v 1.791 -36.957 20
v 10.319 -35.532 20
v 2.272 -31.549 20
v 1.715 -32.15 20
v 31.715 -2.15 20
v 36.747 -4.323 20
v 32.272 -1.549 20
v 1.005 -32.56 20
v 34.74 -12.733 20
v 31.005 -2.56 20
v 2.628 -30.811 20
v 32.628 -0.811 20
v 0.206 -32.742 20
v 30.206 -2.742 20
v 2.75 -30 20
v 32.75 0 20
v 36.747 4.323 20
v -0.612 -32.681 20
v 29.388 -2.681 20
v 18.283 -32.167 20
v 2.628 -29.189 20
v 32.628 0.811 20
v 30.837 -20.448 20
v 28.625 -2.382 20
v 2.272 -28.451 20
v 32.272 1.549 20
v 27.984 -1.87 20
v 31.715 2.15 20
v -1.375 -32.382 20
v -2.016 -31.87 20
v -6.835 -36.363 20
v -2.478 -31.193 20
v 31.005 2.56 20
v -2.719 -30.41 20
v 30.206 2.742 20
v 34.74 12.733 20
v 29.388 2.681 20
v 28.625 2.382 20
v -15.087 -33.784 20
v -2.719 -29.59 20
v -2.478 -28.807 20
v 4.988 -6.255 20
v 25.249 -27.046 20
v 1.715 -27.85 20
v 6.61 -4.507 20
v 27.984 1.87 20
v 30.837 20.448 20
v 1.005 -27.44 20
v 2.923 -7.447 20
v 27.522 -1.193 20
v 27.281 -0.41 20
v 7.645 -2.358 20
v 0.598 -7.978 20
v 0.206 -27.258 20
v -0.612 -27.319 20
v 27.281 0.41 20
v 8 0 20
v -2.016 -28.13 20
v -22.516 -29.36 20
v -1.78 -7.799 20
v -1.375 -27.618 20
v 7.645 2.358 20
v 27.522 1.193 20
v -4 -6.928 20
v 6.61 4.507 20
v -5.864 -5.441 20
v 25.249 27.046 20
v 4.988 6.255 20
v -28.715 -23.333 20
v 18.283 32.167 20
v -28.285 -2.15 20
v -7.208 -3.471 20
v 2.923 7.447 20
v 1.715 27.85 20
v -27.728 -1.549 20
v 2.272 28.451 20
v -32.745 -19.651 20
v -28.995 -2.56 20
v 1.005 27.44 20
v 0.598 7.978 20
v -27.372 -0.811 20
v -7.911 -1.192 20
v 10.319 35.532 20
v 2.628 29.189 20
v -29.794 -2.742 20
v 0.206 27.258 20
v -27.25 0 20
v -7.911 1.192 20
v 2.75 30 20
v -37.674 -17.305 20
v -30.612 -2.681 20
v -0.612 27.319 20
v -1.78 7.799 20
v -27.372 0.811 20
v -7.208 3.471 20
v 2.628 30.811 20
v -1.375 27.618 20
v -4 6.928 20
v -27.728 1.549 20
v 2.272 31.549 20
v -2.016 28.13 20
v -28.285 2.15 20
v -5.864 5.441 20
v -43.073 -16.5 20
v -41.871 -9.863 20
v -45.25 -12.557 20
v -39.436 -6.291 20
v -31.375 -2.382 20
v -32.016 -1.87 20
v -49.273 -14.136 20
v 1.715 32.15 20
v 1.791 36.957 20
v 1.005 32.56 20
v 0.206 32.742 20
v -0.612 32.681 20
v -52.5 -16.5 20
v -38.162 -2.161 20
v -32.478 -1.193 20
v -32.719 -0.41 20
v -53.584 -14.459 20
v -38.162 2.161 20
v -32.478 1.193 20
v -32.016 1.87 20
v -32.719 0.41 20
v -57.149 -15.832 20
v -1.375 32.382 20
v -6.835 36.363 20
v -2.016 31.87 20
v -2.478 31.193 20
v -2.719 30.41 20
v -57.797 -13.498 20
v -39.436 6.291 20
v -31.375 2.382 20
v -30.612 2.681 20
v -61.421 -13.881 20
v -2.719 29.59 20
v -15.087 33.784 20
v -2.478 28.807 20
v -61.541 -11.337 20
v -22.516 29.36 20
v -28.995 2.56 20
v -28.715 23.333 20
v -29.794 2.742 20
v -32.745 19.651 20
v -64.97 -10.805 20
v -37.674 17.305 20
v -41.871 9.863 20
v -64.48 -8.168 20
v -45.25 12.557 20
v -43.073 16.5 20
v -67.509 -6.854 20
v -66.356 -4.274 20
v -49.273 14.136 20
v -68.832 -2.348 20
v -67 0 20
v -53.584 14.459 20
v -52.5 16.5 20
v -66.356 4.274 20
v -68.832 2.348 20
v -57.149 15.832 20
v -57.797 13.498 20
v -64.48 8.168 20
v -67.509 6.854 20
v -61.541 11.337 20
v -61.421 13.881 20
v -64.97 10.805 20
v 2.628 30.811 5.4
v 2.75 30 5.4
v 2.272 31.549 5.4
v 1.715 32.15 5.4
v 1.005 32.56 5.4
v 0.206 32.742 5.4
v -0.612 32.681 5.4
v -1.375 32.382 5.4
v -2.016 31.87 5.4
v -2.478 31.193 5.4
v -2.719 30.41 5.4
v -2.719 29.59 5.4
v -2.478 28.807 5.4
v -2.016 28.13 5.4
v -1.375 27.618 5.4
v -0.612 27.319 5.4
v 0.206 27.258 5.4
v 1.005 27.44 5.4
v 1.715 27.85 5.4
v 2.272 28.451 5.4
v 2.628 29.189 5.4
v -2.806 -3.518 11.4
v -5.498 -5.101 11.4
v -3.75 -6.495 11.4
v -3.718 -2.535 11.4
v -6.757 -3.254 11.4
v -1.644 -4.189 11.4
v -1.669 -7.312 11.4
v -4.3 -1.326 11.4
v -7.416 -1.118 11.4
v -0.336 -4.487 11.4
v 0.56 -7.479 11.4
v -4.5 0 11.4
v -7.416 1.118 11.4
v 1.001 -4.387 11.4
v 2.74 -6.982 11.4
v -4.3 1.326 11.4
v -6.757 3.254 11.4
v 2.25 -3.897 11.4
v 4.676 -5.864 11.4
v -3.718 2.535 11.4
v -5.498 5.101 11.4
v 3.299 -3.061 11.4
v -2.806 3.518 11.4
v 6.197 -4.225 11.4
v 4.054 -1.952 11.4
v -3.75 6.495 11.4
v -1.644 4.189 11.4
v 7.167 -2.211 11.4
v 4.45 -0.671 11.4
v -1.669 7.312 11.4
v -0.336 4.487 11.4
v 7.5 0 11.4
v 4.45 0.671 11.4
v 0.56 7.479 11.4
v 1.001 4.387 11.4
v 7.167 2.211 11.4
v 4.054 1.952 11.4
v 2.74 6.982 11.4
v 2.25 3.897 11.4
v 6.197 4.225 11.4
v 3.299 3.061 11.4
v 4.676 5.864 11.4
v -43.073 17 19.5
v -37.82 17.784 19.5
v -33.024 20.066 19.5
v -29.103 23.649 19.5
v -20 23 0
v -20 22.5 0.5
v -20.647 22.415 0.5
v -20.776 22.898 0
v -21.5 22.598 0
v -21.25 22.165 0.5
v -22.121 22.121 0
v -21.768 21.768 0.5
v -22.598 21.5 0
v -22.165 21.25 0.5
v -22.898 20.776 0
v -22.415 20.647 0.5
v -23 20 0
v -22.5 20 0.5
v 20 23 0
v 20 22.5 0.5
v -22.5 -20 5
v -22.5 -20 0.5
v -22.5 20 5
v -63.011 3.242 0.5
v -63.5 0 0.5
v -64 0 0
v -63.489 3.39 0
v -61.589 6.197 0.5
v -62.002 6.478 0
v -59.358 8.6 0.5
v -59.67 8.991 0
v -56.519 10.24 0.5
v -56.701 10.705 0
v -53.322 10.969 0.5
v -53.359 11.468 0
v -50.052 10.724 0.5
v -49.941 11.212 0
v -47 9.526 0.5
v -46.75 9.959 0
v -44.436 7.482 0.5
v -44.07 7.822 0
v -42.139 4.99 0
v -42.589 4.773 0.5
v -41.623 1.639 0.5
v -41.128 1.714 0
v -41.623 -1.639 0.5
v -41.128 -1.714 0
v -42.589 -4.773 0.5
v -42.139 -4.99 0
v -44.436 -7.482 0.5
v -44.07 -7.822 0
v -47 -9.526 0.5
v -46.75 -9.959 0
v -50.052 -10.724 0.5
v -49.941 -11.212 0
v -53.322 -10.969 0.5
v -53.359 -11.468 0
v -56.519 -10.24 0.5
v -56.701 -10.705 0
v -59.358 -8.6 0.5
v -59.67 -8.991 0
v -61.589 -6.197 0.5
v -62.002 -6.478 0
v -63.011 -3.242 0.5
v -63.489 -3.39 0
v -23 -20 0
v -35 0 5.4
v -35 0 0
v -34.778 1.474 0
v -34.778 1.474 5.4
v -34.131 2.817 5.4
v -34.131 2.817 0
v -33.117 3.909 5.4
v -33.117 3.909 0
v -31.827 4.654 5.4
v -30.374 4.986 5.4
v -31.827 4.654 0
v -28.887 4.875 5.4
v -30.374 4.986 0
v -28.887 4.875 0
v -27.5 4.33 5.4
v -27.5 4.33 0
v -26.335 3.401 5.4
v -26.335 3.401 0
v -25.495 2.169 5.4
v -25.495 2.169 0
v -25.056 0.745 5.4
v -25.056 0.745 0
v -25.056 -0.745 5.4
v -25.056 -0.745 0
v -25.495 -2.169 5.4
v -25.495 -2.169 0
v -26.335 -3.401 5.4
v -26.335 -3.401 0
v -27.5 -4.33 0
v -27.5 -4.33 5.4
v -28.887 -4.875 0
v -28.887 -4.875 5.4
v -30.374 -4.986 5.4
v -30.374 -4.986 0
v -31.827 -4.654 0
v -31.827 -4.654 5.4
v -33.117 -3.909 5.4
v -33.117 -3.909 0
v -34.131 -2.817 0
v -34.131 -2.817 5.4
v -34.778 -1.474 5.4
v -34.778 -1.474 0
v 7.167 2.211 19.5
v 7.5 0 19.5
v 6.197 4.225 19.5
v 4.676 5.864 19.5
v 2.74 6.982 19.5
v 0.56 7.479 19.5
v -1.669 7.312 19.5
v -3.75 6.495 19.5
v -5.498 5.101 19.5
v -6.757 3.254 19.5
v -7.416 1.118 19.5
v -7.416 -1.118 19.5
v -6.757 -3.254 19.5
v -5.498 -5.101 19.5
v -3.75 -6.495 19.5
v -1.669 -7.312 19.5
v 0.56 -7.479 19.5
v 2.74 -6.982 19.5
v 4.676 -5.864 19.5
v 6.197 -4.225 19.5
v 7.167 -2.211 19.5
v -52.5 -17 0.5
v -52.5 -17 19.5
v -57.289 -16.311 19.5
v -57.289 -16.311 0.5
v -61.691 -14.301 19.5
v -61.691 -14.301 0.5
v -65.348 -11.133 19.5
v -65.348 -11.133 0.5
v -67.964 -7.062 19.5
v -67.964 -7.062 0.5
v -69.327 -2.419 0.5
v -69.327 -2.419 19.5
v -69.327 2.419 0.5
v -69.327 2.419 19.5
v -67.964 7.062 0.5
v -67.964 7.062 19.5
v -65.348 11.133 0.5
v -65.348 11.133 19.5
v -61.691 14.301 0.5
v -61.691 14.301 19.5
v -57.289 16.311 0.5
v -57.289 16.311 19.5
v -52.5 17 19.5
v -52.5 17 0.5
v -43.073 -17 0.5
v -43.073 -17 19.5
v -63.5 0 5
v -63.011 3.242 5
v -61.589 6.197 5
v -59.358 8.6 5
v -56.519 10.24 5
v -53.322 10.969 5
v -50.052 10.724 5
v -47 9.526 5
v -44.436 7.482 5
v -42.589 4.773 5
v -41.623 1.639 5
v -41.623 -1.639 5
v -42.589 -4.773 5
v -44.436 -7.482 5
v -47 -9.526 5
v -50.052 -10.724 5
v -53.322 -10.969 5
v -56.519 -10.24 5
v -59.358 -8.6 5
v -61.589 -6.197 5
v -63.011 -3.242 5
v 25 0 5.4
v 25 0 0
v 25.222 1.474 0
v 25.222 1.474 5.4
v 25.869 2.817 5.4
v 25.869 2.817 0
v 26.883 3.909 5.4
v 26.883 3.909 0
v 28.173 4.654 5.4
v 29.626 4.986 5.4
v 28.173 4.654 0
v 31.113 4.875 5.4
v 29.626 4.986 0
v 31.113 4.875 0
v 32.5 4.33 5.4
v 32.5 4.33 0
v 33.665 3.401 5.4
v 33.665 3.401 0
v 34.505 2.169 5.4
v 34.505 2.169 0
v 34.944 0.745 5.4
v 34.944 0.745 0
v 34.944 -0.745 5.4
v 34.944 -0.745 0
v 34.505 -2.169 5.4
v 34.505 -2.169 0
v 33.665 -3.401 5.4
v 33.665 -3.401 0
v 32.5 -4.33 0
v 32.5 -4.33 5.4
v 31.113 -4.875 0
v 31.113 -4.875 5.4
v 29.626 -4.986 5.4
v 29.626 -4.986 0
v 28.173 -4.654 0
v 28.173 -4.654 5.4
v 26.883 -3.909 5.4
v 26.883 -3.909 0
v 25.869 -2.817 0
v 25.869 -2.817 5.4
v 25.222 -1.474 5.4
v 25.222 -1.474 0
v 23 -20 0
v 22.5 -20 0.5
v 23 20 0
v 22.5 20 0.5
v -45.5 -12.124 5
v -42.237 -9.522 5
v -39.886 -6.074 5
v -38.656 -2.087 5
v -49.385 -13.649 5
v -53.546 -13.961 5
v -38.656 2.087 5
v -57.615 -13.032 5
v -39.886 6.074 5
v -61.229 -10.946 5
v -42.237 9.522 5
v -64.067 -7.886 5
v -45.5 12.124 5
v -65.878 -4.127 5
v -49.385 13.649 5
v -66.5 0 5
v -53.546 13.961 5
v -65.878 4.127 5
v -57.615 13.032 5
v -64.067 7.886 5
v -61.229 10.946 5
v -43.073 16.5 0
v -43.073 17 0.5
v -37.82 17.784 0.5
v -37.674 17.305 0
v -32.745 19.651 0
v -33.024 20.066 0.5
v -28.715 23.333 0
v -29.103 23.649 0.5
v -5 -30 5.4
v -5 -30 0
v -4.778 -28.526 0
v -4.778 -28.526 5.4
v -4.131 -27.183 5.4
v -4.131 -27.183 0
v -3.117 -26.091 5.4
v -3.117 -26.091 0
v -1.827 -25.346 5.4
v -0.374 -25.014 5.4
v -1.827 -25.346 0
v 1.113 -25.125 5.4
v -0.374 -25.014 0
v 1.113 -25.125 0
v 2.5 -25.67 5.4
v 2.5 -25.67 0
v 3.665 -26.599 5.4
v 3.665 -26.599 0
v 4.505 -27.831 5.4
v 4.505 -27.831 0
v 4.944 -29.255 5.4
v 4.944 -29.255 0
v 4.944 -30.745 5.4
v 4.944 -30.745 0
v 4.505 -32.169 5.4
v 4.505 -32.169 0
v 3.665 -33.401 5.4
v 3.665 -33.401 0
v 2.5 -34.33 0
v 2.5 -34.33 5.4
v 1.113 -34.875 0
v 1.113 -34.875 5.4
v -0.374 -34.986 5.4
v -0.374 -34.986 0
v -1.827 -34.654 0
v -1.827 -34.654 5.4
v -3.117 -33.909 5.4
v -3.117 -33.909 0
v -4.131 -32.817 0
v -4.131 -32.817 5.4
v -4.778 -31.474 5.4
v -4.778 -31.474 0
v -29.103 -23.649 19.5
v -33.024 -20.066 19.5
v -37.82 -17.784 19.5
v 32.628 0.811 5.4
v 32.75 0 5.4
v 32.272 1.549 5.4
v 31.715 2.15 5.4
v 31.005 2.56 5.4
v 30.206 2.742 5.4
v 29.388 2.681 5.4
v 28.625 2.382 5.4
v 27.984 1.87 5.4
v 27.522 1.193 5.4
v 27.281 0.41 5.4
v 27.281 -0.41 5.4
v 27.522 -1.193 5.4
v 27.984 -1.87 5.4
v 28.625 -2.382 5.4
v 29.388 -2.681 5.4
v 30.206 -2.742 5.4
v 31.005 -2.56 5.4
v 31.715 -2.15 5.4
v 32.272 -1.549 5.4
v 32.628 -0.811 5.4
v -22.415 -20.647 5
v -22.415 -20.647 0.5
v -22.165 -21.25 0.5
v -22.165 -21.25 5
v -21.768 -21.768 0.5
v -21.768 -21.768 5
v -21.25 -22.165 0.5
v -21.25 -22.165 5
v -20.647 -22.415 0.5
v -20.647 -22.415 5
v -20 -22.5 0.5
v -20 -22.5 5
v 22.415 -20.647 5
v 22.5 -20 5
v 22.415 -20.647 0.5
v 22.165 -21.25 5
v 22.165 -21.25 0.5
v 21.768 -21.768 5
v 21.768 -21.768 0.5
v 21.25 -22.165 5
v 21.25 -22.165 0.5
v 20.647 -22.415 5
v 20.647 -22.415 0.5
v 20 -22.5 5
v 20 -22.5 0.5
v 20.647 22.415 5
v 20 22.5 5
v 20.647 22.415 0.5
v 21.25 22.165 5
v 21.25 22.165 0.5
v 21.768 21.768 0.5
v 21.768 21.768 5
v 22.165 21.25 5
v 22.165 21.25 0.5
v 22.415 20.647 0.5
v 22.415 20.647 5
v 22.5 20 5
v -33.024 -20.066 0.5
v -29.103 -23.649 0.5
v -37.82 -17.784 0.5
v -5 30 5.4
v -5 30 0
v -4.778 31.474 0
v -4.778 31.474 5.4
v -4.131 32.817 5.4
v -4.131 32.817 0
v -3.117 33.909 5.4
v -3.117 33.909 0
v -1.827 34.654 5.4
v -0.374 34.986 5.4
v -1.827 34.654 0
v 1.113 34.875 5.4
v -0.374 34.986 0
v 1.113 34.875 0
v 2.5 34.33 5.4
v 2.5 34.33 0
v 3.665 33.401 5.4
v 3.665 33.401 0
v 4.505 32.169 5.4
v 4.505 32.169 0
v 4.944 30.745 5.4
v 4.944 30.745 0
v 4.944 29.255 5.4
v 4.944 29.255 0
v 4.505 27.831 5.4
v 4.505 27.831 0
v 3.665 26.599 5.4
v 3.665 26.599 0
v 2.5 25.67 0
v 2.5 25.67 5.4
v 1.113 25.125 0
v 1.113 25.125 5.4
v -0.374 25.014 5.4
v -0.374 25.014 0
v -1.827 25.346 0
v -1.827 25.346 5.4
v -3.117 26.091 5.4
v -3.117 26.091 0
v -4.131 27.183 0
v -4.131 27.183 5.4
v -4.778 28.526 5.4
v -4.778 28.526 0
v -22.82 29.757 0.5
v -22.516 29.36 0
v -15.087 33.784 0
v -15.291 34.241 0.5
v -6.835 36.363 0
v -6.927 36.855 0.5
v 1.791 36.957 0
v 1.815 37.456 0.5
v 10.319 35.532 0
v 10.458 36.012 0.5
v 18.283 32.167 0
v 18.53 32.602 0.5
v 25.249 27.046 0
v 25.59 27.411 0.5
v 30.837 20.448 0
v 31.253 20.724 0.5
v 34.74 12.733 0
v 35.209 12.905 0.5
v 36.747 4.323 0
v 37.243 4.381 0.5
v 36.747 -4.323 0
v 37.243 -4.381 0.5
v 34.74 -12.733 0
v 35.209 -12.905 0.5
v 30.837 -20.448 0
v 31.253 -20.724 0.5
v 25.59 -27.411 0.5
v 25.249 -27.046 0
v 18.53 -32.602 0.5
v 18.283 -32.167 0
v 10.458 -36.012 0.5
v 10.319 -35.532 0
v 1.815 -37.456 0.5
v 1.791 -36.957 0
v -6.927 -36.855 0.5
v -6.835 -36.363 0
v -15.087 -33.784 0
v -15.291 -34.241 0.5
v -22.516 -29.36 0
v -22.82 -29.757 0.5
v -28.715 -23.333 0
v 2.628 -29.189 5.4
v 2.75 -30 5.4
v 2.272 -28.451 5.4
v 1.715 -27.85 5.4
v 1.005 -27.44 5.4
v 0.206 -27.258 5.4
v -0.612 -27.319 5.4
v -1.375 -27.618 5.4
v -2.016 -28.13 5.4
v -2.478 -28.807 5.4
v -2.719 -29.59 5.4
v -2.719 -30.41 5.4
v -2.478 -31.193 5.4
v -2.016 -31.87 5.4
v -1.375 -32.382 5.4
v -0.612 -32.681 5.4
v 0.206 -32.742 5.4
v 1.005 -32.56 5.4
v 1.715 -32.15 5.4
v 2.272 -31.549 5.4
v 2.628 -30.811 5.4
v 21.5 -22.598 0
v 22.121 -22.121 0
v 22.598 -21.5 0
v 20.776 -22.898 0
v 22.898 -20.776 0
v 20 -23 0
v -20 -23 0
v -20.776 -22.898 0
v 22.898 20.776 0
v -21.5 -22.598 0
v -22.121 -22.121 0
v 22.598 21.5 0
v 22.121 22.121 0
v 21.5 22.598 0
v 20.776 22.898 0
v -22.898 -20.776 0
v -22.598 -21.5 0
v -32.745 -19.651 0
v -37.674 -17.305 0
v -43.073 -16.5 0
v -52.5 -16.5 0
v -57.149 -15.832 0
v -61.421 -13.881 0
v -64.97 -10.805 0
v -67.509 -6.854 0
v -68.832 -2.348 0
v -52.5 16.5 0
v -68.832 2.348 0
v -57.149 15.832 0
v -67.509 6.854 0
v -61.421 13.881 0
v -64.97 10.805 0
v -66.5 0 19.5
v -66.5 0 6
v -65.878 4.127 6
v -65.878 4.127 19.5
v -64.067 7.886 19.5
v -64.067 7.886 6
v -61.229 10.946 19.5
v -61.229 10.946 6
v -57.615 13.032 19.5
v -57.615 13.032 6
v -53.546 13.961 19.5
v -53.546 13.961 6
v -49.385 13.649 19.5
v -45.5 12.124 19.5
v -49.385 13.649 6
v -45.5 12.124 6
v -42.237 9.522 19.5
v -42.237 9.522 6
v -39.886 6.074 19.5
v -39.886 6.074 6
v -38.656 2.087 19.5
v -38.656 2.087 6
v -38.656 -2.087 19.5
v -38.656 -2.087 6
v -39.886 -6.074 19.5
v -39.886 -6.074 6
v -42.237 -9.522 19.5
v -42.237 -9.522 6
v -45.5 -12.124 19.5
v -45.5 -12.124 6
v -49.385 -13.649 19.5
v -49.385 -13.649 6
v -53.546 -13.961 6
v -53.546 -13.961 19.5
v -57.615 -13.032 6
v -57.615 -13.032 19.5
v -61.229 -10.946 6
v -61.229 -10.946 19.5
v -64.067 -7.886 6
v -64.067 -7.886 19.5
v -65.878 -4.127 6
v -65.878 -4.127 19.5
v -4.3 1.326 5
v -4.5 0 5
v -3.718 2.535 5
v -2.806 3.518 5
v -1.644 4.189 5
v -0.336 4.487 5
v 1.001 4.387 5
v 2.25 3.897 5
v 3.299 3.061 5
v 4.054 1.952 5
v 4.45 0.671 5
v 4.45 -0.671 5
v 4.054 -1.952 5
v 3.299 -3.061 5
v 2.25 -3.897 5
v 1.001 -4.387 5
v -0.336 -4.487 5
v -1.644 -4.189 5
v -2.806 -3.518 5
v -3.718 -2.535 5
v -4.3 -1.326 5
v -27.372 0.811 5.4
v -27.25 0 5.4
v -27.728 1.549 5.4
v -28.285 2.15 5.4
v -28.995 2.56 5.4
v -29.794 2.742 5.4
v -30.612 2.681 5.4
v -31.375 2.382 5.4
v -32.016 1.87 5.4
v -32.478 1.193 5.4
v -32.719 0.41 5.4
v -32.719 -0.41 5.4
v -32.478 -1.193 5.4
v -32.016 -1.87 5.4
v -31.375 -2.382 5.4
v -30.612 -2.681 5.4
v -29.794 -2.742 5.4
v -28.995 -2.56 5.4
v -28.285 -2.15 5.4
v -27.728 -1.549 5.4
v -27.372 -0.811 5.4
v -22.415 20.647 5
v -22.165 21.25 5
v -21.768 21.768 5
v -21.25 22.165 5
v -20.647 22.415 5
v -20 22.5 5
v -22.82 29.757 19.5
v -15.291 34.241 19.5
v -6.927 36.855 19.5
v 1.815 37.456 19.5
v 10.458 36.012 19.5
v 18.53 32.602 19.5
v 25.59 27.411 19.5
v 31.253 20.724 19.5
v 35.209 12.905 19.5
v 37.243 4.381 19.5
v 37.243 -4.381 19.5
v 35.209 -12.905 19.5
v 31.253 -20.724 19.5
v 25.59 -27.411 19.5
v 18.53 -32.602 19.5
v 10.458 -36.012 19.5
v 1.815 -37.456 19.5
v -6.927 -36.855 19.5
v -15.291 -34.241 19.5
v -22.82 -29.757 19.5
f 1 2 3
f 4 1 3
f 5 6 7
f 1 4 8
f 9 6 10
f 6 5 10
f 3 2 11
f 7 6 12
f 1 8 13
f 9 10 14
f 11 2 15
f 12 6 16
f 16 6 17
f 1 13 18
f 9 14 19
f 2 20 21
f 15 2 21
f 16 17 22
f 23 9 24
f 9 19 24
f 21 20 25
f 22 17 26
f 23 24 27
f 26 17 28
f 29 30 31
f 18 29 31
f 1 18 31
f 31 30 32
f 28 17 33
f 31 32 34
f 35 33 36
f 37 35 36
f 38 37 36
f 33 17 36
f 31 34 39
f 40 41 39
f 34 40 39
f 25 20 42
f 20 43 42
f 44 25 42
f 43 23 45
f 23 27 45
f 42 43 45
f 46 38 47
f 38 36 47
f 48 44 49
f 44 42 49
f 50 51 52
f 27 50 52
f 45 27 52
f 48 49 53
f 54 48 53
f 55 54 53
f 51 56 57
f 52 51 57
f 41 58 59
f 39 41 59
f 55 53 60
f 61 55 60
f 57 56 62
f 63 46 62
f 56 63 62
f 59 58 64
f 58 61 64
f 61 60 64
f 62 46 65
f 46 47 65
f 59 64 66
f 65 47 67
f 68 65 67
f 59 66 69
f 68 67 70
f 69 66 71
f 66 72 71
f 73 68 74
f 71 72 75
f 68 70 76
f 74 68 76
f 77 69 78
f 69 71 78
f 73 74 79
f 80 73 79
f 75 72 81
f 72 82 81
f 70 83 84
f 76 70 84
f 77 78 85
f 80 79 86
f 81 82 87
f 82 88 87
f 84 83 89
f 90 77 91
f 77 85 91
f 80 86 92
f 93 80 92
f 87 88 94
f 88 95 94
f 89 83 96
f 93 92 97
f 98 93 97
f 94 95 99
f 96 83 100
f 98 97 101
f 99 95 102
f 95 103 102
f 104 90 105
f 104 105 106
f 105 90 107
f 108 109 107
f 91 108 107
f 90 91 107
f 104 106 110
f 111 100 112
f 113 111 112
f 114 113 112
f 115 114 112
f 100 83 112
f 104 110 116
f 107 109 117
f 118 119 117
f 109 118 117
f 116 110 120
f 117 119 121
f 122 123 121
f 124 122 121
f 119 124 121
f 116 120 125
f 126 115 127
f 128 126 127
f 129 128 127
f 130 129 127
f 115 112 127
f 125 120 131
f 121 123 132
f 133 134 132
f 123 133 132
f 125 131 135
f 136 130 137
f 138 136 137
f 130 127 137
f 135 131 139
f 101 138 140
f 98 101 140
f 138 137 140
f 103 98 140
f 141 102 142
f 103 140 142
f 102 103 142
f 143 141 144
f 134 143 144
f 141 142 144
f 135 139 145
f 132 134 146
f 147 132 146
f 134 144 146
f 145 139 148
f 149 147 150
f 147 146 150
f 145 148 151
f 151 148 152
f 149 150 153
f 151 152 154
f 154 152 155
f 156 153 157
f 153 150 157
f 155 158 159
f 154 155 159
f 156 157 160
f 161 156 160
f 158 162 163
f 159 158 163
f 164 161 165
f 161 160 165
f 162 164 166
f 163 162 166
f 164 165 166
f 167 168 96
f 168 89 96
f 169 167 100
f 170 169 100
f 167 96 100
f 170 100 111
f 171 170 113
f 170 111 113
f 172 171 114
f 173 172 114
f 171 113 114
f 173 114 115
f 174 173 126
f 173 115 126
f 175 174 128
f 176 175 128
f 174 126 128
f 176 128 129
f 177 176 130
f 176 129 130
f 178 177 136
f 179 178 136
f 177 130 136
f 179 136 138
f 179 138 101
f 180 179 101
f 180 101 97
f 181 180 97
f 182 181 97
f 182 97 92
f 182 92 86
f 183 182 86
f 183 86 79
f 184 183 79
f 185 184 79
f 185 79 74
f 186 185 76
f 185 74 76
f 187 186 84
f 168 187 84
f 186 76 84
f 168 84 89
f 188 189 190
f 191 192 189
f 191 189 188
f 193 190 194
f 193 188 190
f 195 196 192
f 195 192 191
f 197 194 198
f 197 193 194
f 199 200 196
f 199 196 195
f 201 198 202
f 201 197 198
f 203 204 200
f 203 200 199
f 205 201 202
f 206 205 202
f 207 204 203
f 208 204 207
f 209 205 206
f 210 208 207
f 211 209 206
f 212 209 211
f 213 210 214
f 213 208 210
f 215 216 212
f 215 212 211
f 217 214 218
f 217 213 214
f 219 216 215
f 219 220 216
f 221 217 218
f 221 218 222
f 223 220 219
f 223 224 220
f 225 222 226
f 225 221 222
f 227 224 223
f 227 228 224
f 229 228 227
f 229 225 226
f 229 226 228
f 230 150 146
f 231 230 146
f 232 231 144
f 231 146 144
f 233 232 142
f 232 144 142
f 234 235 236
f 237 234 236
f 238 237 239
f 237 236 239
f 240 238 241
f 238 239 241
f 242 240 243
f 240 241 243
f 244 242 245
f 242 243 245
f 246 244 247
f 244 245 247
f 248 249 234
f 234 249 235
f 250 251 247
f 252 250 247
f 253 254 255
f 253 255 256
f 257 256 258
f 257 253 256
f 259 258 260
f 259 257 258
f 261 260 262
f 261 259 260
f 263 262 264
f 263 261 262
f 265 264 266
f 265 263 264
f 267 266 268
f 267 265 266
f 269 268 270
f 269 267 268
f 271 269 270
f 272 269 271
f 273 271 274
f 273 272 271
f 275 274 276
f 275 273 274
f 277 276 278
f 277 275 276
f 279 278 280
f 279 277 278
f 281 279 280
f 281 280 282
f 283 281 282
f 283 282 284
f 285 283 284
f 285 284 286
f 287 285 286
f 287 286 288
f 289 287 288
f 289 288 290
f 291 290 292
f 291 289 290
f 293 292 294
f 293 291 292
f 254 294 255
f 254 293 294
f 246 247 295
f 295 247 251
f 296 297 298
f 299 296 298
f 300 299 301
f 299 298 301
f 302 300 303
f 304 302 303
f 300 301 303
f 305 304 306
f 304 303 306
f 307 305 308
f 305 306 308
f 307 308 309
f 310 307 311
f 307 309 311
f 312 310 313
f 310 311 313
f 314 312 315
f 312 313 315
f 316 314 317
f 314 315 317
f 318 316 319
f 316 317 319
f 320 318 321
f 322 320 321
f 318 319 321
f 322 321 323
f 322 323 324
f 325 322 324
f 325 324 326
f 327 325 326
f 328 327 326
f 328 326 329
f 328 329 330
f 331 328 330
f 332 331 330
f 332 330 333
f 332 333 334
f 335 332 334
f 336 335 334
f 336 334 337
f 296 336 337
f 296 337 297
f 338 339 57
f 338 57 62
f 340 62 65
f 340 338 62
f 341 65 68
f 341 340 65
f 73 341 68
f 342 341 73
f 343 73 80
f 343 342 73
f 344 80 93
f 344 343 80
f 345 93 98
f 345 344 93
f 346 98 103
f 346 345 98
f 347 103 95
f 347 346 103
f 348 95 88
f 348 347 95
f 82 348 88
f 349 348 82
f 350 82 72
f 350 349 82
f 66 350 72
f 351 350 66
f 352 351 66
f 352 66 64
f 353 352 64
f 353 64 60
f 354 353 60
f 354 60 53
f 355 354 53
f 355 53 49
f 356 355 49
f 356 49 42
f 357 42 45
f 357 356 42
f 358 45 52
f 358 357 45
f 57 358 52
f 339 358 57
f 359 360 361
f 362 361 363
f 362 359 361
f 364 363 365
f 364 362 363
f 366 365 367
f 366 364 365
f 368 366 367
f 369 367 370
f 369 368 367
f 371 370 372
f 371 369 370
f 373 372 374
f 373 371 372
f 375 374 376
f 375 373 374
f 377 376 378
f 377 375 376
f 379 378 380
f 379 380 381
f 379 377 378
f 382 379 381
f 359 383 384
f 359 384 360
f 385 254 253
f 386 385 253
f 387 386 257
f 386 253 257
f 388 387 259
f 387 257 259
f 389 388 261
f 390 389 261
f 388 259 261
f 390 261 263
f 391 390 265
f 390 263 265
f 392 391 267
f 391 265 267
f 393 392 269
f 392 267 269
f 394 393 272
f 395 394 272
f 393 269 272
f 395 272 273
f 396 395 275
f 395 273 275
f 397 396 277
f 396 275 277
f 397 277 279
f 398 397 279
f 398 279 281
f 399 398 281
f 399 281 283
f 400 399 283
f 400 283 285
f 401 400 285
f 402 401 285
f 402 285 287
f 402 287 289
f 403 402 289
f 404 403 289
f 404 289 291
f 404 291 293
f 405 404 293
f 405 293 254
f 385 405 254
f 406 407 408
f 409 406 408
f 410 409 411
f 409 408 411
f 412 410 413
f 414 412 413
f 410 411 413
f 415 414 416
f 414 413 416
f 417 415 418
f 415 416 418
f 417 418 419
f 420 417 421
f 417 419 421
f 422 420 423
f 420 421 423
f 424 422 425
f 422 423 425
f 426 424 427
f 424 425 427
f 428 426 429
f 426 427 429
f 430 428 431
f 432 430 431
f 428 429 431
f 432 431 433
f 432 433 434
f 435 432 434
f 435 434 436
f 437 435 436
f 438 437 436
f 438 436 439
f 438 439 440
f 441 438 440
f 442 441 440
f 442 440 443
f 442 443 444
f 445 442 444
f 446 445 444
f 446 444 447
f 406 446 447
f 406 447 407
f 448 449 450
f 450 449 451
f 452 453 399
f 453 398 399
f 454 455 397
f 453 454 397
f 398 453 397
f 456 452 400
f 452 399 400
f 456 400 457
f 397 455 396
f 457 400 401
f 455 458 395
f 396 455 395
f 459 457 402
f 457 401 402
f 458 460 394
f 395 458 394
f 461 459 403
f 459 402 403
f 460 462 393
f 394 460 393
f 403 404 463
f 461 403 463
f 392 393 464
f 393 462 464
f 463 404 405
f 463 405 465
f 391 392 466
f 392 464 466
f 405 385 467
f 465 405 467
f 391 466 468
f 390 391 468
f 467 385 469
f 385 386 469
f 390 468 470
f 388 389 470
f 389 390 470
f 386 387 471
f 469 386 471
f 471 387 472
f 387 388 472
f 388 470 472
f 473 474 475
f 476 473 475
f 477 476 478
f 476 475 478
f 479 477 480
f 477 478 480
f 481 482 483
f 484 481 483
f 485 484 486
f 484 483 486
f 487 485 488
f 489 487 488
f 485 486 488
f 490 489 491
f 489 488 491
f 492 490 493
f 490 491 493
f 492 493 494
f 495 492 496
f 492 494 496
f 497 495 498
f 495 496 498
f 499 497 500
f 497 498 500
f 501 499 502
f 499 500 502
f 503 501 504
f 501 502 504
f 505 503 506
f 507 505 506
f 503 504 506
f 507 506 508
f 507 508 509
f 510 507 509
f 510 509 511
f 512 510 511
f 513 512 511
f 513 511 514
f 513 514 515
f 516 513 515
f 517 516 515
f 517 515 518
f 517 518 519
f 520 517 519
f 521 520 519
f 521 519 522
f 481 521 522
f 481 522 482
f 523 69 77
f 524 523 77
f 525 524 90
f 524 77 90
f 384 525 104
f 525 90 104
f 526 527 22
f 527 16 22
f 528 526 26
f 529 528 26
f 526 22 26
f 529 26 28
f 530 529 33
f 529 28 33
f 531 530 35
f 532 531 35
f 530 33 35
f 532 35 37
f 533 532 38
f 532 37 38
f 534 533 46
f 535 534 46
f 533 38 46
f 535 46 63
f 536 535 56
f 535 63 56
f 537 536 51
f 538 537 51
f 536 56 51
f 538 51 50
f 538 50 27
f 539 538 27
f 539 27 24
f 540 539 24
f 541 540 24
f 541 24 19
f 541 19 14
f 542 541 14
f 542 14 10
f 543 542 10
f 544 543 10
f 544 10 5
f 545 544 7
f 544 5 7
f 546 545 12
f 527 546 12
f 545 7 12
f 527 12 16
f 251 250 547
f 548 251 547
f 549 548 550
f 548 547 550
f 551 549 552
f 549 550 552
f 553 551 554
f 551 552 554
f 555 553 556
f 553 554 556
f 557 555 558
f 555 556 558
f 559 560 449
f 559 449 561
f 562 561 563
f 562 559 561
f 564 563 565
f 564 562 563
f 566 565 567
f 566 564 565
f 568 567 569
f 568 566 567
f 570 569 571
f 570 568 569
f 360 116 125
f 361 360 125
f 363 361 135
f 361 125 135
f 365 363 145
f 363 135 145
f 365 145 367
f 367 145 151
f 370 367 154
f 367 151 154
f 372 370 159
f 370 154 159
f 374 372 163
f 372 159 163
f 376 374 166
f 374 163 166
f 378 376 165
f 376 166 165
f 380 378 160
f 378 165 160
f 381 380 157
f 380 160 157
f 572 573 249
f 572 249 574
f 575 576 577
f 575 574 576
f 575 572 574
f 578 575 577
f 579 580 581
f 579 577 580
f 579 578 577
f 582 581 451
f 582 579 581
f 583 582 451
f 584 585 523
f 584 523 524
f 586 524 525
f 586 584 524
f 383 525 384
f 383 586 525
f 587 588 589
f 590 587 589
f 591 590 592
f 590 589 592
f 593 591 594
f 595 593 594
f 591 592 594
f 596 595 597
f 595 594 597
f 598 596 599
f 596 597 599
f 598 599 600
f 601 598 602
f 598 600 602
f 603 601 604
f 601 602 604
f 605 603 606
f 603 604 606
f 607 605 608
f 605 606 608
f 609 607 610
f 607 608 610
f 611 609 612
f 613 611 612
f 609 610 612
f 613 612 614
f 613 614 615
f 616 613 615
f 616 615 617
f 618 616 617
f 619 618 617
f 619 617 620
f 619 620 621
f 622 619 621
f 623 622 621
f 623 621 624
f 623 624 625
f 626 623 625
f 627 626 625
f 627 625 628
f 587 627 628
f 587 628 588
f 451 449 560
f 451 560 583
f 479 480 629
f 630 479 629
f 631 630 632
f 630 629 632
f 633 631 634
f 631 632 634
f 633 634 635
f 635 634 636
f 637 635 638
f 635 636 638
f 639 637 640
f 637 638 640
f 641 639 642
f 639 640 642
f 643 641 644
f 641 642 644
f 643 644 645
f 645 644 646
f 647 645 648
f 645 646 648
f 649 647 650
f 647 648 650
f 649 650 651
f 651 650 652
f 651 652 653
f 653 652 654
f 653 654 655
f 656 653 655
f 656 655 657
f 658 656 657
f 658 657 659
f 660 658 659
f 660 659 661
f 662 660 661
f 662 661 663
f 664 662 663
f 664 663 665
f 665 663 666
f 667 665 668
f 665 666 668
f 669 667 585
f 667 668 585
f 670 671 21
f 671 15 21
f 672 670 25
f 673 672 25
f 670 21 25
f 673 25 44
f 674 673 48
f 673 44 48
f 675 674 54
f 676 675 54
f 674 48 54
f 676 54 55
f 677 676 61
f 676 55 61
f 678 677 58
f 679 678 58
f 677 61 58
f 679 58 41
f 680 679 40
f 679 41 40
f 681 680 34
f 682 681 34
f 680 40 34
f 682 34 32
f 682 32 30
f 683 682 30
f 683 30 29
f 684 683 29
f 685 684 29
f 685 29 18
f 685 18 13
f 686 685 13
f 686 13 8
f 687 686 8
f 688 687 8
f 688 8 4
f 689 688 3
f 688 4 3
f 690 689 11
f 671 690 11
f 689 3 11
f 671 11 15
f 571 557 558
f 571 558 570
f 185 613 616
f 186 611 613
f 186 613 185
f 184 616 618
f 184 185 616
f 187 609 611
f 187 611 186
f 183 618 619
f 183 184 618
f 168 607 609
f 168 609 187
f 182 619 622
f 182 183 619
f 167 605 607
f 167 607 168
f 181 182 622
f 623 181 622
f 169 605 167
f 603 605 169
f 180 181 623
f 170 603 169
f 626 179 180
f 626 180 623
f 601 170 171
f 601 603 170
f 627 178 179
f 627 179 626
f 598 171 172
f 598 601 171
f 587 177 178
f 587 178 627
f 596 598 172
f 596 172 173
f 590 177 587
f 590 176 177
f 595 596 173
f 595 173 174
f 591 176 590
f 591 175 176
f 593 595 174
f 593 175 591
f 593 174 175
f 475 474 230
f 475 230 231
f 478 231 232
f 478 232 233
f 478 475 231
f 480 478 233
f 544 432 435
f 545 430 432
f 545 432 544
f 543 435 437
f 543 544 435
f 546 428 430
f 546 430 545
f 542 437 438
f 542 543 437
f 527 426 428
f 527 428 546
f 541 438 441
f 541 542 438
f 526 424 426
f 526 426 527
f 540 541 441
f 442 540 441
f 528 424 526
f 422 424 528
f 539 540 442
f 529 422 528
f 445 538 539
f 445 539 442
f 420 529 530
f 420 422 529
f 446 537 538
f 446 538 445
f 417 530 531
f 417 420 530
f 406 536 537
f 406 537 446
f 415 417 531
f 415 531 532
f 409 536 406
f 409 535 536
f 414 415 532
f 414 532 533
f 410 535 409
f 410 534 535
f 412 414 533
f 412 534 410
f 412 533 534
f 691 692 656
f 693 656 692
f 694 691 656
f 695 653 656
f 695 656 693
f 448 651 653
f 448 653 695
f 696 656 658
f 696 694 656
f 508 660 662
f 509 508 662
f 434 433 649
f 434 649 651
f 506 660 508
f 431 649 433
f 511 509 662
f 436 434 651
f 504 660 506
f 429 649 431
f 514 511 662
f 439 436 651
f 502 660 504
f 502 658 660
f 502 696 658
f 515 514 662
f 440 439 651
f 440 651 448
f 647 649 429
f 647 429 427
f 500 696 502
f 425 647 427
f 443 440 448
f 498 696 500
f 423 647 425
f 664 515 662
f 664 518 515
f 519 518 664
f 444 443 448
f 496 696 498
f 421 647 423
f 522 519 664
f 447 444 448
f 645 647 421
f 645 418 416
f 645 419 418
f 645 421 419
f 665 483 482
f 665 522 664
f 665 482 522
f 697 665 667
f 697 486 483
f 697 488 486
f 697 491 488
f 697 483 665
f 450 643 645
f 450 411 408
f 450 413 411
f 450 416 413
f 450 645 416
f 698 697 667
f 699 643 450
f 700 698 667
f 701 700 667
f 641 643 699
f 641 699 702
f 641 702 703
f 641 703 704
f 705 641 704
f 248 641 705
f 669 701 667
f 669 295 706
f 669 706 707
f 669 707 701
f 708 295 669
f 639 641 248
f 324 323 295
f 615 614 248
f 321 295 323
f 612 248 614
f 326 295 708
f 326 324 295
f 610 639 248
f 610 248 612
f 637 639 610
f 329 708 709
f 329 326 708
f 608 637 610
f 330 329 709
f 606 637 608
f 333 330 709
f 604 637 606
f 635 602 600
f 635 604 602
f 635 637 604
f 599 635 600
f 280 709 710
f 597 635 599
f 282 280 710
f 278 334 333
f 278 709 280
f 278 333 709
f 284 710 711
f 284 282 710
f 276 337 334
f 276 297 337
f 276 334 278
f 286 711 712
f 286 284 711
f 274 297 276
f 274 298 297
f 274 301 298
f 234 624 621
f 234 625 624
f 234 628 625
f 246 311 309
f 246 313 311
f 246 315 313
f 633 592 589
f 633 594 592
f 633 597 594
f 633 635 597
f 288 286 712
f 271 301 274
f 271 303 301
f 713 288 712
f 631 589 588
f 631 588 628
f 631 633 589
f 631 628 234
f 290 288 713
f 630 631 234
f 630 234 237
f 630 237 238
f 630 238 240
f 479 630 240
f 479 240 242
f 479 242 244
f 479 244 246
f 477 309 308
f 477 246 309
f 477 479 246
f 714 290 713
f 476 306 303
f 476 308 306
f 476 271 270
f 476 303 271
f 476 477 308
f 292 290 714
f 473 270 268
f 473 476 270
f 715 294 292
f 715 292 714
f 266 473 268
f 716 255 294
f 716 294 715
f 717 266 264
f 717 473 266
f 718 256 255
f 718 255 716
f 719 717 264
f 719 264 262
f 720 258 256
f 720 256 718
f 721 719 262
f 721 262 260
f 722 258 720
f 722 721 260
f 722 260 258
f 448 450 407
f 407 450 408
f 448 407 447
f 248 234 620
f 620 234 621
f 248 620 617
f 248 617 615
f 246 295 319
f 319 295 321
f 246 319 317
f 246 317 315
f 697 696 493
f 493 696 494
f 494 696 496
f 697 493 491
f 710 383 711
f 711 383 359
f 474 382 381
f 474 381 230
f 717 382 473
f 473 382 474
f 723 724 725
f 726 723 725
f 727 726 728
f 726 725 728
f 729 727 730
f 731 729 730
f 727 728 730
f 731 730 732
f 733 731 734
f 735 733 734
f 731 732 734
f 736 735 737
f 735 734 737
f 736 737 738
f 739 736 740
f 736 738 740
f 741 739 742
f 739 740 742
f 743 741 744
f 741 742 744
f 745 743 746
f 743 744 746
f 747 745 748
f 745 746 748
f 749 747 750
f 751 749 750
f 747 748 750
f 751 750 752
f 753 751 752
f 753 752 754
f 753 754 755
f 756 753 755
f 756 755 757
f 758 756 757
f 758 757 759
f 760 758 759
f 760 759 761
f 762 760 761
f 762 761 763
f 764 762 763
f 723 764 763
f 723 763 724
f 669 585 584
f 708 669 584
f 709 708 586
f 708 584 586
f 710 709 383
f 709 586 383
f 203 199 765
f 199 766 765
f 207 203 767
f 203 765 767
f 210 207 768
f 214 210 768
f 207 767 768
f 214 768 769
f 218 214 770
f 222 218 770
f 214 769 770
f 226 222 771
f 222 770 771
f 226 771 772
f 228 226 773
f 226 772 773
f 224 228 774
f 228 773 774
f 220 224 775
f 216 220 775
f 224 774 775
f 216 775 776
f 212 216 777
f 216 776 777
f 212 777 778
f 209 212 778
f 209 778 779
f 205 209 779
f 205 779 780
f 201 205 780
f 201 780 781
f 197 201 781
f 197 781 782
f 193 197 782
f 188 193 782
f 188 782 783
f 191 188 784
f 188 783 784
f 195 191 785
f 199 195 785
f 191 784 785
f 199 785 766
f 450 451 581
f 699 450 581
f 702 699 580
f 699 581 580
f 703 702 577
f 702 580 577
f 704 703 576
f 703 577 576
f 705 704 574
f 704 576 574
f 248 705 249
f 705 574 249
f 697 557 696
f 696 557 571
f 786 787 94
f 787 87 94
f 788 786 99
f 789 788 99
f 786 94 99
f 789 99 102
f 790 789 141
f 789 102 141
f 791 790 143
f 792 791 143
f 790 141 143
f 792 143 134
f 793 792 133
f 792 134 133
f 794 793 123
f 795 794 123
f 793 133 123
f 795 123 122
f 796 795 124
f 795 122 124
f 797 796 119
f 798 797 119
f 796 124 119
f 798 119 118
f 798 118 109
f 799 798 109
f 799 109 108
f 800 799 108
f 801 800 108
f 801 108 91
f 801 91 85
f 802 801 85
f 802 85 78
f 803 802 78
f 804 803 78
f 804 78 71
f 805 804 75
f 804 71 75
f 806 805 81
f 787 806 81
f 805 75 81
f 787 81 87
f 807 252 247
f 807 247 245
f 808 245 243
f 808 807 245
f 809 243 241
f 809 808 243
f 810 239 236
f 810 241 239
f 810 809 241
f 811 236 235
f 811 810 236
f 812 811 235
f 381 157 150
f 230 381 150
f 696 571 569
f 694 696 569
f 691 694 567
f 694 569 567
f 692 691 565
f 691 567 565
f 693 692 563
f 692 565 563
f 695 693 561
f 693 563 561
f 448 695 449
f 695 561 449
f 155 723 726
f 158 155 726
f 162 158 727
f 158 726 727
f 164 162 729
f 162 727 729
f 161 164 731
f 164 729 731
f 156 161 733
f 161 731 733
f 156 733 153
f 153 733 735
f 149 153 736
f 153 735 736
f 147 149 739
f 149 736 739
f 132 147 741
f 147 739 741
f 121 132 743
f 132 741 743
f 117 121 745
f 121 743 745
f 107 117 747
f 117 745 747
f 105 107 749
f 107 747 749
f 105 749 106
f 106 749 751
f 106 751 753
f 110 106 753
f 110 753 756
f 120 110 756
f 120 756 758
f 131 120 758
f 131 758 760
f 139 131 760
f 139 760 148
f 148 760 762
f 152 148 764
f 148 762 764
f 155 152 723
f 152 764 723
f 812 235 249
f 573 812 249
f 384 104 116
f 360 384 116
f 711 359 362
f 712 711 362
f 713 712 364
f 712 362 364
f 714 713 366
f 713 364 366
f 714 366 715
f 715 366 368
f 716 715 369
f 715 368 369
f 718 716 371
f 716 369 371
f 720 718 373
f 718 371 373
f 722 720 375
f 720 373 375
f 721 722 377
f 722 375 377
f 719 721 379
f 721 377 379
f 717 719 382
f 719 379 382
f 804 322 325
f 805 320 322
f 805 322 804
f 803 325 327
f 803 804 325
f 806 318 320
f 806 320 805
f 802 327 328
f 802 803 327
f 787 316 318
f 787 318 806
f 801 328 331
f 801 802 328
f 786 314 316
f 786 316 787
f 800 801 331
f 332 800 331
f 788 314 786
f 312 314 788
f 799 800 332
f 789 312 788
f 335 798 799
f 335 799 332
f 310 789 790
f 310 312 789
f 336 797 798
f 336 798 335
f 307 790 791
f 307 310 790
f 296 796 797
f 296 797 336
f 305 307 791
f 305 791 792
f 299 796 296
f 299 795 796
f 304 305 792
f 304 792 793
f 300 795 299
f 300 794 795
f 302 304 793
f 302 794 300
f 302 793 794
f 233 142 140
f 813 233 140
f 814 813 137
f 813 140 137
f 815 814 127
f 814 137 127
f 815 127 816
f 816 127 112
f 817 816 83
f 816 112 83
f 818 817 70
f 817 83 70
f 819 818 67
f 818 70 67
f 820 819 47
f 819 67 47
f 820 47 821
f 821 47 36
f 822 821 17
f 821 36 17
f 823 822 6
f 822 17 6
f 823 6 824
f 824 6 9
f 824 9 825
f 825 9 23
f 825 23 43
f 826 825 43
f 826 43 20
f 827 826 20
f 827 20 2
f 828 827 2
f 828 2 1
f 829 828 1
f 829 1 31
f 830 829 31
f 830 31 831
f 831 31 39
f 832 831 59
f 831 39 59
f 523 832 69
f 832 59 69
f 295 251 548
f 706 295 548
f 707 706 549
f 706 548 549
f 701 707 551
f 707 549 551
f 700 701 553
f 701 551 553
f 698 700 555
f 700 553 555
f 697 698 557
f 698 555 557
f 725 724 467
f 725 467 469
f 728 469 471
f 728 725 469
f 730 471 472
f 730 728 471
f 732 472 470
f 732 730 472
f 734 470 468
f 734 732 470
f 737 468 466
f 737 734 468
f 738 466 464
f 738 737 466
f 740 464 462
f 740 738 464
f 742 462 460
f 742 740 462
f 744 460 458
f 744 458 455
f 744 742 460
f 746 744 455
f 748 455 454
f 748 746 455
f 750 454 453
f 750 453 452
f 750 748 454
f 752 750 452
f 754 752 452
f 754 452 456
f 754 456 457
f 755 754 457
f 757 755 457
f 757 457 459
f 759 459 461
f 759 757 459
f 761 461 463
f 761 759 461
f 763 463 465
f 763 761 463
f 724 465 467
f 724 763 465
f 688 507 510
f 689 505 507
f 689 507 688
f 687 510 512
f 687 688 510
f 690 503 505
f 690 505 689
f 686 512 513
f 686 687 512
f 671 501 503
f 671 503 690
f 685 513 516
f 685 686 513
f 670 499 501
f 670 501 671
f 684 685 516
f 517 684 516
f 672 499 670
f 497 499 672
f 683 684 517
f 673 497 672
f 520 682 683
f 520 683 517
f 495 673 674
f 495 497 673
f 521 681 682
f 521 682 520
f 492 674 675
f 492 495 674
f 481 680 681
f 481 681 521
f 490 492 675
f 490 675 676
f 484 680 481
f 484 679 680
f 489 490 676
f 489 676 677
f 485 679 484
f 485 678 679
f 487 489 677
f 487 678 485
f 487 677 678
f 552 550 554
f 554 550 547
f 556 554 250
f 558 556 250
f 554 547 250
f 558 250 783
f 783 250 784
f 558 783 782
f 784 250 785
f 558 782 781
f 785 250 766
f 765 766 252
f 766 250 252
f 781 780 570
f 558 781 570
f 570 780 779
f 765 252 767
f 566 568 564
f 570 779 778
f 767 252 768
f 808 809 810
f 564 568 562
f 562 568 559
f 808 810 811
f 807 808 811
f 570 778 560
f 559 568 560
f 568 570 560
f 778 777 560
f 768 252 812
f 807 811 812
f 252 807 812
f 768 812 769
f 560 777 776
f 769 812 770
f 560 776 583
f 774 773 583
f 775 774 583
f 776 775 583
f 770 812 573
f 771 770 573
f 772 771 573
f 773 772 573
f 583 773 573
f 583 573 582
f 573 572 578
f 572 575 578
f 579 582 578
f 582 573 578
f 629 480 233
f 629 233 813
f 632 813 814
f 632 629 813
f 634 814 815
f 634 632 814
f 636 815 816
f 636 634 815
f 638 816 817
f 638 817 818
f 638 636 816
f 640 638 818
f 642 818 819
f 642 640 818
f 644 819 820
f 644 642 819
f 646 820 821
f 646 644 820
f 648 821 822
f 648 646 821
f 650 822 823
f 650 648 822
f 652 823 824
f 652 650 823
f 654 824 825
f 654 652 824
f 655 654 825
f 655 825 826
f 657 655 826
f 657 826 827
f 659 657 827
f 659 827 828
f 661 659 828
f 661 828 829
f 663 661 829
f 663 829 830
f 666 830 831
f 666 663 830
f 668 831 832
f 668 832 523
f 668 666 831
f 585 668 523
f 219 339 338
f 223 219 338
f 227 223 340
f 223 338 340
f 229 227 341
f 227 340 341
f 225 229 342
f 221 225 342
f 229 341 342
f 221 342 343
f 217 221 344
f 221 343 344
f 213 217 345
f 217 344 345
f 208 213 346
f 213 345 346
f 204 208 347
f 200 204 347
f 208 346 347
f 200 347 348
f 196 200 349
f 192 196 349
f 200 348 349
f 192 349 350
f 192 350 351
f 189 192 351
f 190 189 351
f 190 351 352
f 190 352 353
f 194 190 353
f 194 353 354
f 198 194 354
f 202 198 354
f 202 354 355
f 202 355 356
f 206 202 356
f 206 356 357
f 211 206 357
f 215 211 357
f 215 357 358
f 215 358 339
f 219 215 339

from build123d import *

# Parameters (mm, degrees)
BOSS_EXTRUDE1_DEPTH                                 = 20
SKETCH1_3_W                                         = 45
SKETCH1_3_H                                         = 45
CUT_EXTRUDE2_DEPTH                                  = 5
CBORE_FOR_M8_HEX_SOCKET_HEAD_CAP_SCREW1_D           = 9
CBORE_FOR_M8_HEX_SOCKET_HEAD_CAP_SCREW1_DEPTH       = 23
CBORE_FOR_M8_HEX_SOCKET_HEAD_CAP_SCREW1_CBORE_D     = 15
CBORE_FOR_M8_HEX_SOCKET_HEAD_CAP_SCREW1_CBORE_DEPTH = 8.6
CBORE_FOR_M8_HEX_SOCKET_HEAD_CAP_SCREW1_TIP         = 2.703872786
FILLET2_R                                           = 2.5
SKETCH4_R                                           = 11
CUT_EXTRUDE3_DEPTH                                  = 6
SKETCH5_R                                           = 14
CUT_EXTRUDE4_DEPTH                                  = 1
CUT_EXTRUDE4_DEPTH_BACK                             = 15
CHAMFER1_SIZE                                       = 0.5
CBORE_FOR_M5_HEX_SOCKET_HEAD_CAP_SCREW1_D           = 5.5
CBORE_FOR_M5_HEX_SOCKET_HEAD_CAP_SCREW1_CBORE_D     = 10
CBORE_FOR_M5_HEX_SOCKET_HEAD_CAP_SCREW1_CBORE_DEPTH = 5.4


with BuildPart() as part:
    # Sketch1 → Boss-Extrude1 (new body)
    with BuildSketch(Plane.XY):
        with BuildLine():
            Line((-52.5, 17), (-43.072613109, 17))
            ThreePointArc((-43.072613109, 17), (-35.337121021, 18.746933761), (-29.103116965, 23.648648649))
            ThreePointArc((-29.103116965, 23.648648649), (37.5, 0), (-29.103116965, -23.648648649))
            ThreePointArc((-29.103116965, -23.648648649), (-35.337121021, -18.746933761), (-43.072613109, -17))
            Line((-43.072613109, -17), (-52.5, -17))
            ThreePointArc((-52.5, -17), (-69.5, 0), (-52.5, 17))
        make_face()
    extrude(amount=BOSS_EXTRUDE1_DEPTH)

    # Sketch1<3> → Cut-Extrude2 (cut)
    with BuildSketch(Plane.XY):
        Rectangle(SKETCH1_3_W, SKETCH1_3_H)
    extrude(amount=CUT_EXTRUDE2_DEPTH, mode=Mode.SUBTRACT)

    # CBORE for M8 Hex Socket Head Cap Screw1
    with Locations(Plane.XY.offset(20)):
        with Locations((0, 0)):
            CounterBoreHole(CBORE_FOR_M8_HEX_SOCKET_HEAD_CAP_SCREW1_D / 2, CBORE_FOR_M8_HEX_SOCKET_HEAD_CAP_SCREW1_CBORE_D / 2, CBORE_FOR_M8_HEX_SOCKET_HEAD_CAP_SCREW1_CBORE_DEPTH, depth=CBORE_FOR_M8_HEX_SOCKET_HEAD_CAP_SCREW1_DEPTH)
            with Locations((0, 0, -(CBORE_FOR_M8_HEX_SOCKET_HEAD_CAP_SCREW1_DEPTH + CBORE_FOR_M8_HEX_SOCKET_HEAD_CAP_SCREW1_TIP / 2))):  # 118° drill point
                Cone(0, CBORE_FOR_M8_HEX_SOCKET_HEAD_CAP_SCREW1_D / 2, CBORE_FOR_M8_HEX_SOCKET_HEAD_CAP_SCREW1_TIP, mode=Mode.SUBTRACT)

    # Fillet2
    fillet2_edges = [part.edges().sort_by_distance(p)[0] for p in [
        (-22.5, 22.5, 2.5),
        (22.5, 22.5, 2.5),
        (22.5, -22.5, 2.5),
        (-22.5, -22.5, 2.5),
    ]]
    fillet(fillet2_edges, radius=FILLET2_R)

    # Sketch4 → Cut-Extrude3 (cut)
    with BuildSketch(Plane(origin=(0, 0, 0), x_dir=(-1, 0, 0), z_dir=(0, 0, -1))):
        with Locations((52.5, 0)):
            Circle(SKETCH4_R)
    extrude(amount=-CUT_EXTRUDE3_DEPTH, mode=Mode.SUBTRACT)

    # Sketch5 → Cut-Extrude4 (cut, two sides)
    with BuildSketch(Plane(origin=(0, 0, 6), x_dir=(-1, 0, 0), z_dir=(0, 0, -1))) as cut_extrude4_sk:
        with Locations((52.5, 0)):
            Circle(SKETCH5_R)
    extrude(amount=CUT_EXTRUDE4_DEPTH, mode=Mode.SUBTRACT)
    extrude(cut_extrude4_sk.sketch, amount=-CUT_EXTRUDE4_DEPTH_BACK, mode=Mode.SUBTRACT)

    # Chamfer1
    chamfer1_edges = [part.edges().sort_by_distance(p)[0] for p in [
        (-47.786306554, 17, 20),
        (-69.5, 0, 20),
        (-47.786306554, -17, 20),
        (-35.337121021, -18.746933761, 20),
        (-7.5, 0, 20),
        (37.5, 0, 20),
        (22.5, 0, 0),
        (0, 22.5, 0),
        (0, -22.5, 0),
        (-22.5, 0, 0),
        (21.767766953, 21.767766953, 0),
        (21.767766953, -21.767766953, 0),
        (-21.767766953, -21.767766953, 0),
        (-21.767766953, 21.767766953, 0),
        (-35.337121021, -18.746933761, 0),
        (-41.5, 0, 0),
        (-47.786306554, -17, 0),
        (-38.5, 0, 20),
        (-69.5, 0, 0),
        (-35.337121021, 18.746933761, 20),
        (-47.786306554, 17, 0),
        (-35.337121021, 18.746933761, 0),
        (37.5, 0, 0),
    ]]
    chamfer(chamfer1_edges, length=CHAMFER1_SIZE)

    # CBORE for M5 Hex Socket Head Cap Screw1 (through all)
    with Locations(Plane(origin=(0, 0, 0), x_dir=(-1, 0, 0), z_dir=(0, 0, -1))):
        with Locations((0, 30), (-30, 0), (0, -30), (30, 0)):
            CounterBoreHole(CBORE_FOR_M5_HEX_SOCKET_HEAD_CAP_SCREW1_D / 2, CBORE_FOR_M5_HEX_SOCKET_HEAD_CAP_SCREW1_CBORE_D / 2, CBORE_FOR_M5_HEX_SOCKET_HEAD_CAP_SCREW1_CBORE_DEPTH)


solid = part.part
